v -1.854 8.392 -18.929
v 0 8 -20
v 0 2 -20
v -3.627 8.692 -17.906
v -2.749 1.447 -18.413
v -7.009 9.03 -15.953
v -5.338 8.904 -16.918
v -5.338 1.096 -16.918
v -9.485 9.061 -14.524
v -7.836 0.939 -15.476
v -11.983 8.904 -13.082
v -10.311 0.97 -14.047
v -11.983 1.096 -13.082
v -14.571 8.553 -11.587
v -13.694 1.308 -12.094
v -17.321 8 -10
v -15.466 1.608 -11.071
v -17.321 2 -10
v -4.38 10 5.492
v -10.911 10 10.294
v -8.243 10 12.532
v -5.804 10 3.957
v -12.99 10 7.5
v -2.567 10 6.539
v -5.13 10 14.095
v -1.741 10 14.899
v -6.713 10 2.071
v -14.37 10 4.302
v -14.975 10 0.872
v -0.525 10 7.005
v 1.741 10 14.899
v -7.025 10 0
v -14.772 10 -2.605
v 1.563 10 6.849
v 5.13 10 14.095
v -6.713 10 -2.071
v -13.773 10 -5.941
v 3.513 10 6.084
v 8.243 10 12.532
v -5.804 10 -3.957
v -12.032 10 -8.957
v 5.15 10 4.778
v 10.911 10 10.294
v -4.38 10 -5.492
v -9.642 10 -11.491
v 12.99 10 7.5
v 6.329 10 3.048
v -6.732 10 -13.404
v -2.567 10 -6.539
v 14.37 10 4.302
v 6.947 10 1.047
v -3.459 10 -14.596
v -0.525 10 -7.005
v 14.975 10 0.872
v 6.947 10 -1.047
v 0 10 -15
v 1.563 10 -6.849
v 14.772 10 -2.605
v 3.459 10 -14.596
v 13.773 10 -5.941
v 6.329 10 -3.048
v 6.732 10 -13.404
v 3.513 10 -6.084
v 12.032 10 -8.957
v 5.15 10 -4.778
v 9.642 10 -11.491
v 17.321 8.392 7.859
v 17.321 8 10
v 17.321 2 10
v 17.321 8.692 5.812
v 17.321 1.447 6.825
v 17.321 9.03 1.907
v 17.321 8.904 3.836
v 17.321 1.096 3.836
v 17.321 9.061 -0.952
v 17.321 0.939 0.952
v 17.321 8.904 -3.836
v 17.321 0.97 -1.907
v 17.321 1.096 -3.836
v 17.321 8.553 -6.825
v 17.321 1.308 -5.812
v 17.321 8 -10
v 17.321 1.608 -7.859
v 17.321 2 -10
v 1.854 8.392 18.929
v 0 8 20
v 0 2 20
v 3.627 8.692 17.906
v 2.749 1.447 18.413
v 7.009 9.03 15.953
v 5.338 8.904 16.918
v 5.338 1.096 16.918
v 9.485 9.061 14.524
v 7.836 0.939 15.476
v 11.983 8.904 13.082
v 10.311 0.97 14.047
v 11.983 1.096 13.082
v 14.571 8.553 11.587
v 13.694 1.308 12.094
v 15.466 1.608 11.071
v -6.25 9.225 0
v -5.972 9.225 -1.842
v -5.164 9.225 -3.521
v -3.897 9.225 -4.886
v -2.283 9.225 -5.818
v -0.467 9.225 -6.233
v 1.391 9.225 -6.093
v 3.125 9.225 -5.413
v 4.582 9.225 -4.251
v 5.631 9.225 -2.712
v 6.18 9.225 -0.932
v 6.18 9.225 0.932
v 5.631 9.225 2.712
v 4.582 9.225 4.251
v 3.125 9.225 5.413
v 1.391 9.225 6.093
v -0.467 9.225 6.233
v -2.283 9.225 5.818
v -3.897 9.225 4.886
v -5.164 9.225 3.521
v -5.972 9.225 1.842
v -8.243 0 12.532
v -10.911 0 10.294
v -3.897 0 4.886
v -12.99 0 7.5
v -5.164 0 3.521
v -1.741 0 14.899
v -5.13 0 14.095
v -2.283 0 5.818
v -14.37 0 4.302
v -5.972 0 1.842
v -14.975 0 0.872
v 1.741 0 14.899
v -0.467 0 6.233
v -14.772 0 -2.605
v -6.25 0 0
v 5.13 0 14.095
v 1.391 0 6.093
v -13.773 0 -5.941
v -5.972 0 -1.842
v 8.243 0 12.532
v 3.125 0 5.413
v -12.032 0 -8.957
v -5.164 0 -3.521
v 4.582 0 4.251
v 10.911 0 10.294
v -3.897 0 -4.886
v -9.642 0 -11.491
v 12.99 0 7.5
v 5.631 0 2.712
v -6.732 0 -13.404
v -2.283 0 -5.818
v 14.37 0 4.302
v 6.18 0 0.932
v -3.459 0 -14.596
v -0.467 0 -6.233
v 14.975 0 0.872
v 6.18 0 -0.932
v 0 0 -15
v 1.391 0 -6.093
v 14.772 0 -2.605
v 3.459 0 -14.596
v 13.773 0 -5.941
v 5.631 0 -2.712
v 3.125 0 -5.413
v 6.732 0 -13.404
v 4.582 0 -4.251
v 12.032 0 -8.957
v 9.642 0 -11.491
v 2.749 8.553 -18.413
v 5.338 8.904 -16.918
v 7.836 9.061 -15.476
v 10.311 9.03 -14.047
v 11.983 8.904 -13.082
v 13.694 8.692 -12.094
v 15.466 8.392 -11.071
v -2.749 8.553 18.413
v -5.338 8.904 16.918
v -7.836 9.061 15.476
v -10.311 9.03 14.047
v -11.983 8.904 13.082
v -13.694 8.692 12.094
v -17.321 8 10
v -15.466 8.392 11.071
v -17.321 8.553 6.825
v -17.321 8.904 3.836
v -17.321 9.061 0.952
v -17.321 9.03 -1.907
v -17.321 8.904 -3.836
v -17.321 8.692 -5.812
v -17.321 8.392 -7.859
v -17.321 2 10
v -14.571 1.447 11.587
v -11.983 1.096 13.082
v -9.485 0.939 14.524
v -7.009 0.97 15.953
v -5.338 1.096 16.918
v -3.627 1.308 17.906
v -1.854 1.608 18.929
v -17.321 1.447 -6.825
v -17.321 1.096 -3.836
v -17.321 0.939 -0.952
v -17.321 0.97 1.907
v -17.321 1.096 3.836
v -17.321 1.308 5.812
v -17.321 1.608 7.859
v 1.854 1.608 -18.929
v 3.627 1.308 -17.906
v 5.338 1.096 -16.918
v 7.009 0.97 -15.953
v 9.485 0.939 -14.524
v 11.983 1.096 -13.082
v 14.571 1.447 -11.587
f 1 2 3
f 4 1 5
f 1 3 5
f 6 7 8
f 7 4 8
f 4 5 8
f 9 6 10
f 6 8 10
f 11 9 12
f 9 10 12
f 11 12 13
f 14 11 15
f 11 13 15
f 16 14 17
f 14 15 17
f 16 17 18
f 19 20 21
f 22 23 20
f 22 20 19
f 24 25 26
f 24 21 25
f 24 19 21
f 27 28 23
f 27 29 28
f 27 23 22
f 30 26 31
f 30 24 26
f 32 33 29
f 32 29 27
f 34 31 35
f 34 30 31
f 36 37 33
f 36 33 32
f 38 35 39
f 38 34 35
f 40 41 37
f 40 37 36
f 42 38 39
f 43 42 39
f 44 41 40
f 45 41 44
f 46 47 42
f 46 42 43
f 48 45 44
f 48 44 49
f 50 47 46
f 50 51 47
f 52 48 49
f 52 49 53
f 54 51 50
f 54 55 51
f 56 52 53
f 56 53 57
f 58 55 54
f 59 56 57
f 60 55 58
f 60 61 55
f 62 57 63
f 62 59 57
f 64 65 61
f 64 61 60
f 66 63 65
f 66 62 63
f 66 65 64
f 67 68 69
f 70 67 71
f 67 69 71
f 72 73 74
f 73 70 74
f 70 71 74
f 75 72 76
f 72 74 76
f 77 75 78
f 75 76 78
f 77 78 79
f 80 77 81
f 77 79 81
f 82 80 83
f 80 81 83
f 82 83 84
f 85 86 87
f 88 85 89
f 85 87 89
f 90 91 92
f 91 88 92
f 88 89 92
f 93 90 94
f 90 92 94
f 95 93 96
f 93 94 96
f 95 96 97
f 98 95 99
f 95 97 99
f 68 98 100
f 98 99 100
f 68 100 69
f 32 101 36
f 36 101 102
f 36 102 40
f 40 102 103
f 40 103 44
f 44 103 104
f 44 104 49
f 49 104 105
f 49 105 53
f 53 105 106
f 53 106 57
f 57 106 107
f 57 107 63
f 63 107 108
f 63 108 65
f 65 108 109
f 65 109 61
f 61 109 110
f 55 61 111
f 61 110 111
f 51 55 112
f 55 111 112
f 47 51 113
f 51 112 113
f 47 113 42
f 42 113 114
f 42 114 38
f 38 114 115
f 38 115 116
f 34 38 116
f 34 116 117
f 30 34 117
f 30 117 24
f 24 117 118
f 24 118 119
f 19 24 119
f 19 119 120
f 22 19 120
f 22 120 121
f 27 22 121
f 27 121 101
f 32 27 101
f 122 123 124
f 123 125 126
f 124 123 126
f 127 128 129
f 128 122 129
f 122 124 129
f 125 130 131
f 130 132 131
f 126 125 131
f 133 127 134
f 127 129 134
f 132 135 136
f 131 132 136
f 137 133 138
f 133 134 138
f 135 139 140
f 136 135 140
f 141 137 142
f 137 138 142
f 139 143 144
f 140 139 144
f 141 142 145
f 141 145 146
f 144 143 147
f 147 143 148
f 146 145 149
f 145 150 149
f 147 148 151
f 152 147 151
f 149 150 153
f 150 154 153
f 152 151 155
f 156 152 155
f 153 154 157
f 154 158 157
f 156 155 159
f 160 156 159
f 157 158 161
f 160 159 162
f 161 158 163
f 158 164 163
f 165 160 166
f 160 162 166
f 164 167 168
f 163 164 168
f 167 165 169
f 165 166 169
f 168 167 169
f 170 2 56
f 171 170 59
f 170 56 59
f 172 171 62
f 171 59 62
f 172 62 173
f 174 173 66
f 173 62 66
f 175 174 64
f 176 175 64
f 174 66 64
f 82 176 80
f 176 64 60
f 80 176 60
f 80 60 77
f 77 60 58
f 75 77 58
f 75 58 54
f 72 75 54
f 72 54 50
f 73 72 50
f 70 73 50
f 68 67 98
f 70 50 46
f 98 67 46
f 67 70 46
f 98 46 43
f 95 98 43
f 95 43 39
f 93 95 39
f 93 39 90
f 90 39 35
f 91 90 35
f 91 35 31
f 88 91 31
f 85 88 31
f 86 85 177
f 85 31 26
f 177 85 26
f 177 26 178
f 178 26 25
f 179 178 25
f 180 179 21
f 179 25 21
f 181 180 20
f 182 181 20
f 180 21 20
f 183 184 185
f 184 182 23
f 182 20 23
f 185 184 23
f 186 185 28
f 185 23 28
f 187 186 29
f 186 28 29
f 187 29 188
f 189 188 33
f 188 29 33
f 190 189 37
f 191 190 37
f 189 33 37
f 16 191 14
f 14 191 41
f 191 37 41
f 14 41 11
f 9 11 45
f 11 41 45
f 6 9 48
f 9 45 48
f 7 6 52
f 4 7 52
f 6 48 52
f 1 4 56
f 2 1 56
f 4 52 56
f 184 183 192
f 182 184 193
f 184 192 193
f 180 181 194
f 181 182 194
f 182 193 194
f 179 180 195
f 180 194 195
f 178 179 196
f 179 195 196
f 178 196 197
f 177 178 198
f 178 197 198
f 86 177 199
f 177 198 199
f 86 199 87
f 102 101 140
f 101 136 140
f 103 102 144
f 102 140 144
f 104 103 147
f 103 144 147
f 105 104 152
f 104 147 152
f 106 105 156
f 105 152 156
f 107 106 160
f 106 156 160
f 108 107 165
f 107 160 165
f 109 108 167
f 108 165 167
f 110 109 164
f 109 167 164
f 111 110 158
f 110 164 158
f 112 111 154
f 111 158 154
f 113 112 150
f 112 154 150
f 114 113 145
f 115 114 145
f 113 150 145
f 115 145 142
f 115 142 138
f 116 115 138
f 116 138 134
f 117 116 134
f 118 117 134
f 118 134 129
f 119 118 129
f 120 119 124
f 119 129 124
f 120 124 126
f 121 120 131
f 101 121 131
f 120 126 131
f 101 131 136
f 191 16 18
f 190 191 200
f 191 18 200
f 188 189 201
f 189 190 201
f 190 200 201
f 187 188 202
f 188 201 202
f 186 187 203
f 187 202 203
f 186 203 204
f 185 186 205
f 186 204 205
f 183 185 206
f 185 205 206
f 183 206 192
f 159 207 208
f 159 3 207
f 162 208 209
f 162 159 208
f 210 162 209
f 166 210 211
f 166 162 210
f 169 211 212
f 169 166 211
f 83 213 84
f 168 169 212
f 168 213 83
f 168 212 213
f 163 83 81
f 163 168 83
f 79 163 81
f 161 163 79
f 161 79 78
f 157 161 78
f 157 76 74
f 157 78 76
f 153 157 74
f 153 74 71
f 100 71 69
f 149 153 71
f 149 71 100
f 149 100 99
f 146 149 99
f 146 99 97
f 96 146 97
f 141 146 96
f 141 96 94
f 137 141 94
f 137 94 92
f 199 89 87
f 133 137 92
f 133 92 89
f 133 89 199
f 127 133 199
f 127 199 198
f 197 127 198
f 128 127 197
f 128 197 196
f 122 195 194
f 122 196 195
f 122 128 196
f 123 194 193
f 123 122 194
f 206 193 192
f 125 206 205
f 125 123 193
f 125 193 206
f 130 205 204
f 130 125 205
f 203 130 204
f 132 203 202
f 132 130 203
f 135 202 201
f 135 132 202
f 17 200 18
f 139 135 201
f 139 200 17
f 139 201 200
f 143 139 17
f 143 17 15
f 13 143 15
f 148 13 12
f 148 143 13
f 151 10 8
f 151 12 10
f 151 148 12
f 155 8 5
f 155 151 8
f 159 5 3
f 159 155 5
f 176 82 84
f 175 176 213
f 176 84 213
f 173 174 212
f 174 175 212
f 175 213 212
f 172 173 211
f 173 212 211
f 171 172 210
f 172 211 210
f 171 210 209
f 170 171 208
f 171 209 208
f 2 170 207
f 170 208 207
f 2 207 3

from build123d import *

# Parameters (mm, degrees)
EXTRUDE_1_DEPTH       = 10
M14X1_5_1_D           = 12.5
M14X1_5_1_CSINK_D     = 14.05
M14X1_5_1_CSINK_ANGLE = 90


with BuildPart() as part:
    # 草图1 → 凸台-拉伸1 (new body)
    with BuildSketch(Plane(origin=(0, 0, 0), x_dir=(1, 0, 0), z_dir=(0, 1, 0))):
        Polygon((0, -20), (17.320508076, -10), (17.320508076, 10), (0, 20), (-17.320508076, 10), (-17.320508076, -10), align=None)
    extrude(amount=EXTRUDE_1_DEPTH)

    # M14x1.5 螺纹孔1 (through all)
    with Locations(Plane(origin=(0, 10, 0), x_dir=(1, 0, 0), z_dir=(0, 1, 0))):
        with Locations((0, 0)):
            CounterSinkHole(M14X1_5_1_D / 2, M14X1_5_1_CSINK_D / 2, counter_sink_angle=M14X1_5_1_CSINK_ANGLE)

    # 草图7 → 切除-旋转1 (revolve, cut)
    with BuildSketch(Plane(origin=(0, 0, 0), x_dir=(0, 0, -1), z_dir=(1, 0, 0))):
        Polygon((20, 10), (20, 8), (15, 10), align=None)
        Polygon((20, 2), (15, 0), (20, 0), align=None)
    revolve(axis=Axis((0, 15.71595543, 0), (0, -1, 0)), mode=Mode.SUBTRACT)


solid = part.part
